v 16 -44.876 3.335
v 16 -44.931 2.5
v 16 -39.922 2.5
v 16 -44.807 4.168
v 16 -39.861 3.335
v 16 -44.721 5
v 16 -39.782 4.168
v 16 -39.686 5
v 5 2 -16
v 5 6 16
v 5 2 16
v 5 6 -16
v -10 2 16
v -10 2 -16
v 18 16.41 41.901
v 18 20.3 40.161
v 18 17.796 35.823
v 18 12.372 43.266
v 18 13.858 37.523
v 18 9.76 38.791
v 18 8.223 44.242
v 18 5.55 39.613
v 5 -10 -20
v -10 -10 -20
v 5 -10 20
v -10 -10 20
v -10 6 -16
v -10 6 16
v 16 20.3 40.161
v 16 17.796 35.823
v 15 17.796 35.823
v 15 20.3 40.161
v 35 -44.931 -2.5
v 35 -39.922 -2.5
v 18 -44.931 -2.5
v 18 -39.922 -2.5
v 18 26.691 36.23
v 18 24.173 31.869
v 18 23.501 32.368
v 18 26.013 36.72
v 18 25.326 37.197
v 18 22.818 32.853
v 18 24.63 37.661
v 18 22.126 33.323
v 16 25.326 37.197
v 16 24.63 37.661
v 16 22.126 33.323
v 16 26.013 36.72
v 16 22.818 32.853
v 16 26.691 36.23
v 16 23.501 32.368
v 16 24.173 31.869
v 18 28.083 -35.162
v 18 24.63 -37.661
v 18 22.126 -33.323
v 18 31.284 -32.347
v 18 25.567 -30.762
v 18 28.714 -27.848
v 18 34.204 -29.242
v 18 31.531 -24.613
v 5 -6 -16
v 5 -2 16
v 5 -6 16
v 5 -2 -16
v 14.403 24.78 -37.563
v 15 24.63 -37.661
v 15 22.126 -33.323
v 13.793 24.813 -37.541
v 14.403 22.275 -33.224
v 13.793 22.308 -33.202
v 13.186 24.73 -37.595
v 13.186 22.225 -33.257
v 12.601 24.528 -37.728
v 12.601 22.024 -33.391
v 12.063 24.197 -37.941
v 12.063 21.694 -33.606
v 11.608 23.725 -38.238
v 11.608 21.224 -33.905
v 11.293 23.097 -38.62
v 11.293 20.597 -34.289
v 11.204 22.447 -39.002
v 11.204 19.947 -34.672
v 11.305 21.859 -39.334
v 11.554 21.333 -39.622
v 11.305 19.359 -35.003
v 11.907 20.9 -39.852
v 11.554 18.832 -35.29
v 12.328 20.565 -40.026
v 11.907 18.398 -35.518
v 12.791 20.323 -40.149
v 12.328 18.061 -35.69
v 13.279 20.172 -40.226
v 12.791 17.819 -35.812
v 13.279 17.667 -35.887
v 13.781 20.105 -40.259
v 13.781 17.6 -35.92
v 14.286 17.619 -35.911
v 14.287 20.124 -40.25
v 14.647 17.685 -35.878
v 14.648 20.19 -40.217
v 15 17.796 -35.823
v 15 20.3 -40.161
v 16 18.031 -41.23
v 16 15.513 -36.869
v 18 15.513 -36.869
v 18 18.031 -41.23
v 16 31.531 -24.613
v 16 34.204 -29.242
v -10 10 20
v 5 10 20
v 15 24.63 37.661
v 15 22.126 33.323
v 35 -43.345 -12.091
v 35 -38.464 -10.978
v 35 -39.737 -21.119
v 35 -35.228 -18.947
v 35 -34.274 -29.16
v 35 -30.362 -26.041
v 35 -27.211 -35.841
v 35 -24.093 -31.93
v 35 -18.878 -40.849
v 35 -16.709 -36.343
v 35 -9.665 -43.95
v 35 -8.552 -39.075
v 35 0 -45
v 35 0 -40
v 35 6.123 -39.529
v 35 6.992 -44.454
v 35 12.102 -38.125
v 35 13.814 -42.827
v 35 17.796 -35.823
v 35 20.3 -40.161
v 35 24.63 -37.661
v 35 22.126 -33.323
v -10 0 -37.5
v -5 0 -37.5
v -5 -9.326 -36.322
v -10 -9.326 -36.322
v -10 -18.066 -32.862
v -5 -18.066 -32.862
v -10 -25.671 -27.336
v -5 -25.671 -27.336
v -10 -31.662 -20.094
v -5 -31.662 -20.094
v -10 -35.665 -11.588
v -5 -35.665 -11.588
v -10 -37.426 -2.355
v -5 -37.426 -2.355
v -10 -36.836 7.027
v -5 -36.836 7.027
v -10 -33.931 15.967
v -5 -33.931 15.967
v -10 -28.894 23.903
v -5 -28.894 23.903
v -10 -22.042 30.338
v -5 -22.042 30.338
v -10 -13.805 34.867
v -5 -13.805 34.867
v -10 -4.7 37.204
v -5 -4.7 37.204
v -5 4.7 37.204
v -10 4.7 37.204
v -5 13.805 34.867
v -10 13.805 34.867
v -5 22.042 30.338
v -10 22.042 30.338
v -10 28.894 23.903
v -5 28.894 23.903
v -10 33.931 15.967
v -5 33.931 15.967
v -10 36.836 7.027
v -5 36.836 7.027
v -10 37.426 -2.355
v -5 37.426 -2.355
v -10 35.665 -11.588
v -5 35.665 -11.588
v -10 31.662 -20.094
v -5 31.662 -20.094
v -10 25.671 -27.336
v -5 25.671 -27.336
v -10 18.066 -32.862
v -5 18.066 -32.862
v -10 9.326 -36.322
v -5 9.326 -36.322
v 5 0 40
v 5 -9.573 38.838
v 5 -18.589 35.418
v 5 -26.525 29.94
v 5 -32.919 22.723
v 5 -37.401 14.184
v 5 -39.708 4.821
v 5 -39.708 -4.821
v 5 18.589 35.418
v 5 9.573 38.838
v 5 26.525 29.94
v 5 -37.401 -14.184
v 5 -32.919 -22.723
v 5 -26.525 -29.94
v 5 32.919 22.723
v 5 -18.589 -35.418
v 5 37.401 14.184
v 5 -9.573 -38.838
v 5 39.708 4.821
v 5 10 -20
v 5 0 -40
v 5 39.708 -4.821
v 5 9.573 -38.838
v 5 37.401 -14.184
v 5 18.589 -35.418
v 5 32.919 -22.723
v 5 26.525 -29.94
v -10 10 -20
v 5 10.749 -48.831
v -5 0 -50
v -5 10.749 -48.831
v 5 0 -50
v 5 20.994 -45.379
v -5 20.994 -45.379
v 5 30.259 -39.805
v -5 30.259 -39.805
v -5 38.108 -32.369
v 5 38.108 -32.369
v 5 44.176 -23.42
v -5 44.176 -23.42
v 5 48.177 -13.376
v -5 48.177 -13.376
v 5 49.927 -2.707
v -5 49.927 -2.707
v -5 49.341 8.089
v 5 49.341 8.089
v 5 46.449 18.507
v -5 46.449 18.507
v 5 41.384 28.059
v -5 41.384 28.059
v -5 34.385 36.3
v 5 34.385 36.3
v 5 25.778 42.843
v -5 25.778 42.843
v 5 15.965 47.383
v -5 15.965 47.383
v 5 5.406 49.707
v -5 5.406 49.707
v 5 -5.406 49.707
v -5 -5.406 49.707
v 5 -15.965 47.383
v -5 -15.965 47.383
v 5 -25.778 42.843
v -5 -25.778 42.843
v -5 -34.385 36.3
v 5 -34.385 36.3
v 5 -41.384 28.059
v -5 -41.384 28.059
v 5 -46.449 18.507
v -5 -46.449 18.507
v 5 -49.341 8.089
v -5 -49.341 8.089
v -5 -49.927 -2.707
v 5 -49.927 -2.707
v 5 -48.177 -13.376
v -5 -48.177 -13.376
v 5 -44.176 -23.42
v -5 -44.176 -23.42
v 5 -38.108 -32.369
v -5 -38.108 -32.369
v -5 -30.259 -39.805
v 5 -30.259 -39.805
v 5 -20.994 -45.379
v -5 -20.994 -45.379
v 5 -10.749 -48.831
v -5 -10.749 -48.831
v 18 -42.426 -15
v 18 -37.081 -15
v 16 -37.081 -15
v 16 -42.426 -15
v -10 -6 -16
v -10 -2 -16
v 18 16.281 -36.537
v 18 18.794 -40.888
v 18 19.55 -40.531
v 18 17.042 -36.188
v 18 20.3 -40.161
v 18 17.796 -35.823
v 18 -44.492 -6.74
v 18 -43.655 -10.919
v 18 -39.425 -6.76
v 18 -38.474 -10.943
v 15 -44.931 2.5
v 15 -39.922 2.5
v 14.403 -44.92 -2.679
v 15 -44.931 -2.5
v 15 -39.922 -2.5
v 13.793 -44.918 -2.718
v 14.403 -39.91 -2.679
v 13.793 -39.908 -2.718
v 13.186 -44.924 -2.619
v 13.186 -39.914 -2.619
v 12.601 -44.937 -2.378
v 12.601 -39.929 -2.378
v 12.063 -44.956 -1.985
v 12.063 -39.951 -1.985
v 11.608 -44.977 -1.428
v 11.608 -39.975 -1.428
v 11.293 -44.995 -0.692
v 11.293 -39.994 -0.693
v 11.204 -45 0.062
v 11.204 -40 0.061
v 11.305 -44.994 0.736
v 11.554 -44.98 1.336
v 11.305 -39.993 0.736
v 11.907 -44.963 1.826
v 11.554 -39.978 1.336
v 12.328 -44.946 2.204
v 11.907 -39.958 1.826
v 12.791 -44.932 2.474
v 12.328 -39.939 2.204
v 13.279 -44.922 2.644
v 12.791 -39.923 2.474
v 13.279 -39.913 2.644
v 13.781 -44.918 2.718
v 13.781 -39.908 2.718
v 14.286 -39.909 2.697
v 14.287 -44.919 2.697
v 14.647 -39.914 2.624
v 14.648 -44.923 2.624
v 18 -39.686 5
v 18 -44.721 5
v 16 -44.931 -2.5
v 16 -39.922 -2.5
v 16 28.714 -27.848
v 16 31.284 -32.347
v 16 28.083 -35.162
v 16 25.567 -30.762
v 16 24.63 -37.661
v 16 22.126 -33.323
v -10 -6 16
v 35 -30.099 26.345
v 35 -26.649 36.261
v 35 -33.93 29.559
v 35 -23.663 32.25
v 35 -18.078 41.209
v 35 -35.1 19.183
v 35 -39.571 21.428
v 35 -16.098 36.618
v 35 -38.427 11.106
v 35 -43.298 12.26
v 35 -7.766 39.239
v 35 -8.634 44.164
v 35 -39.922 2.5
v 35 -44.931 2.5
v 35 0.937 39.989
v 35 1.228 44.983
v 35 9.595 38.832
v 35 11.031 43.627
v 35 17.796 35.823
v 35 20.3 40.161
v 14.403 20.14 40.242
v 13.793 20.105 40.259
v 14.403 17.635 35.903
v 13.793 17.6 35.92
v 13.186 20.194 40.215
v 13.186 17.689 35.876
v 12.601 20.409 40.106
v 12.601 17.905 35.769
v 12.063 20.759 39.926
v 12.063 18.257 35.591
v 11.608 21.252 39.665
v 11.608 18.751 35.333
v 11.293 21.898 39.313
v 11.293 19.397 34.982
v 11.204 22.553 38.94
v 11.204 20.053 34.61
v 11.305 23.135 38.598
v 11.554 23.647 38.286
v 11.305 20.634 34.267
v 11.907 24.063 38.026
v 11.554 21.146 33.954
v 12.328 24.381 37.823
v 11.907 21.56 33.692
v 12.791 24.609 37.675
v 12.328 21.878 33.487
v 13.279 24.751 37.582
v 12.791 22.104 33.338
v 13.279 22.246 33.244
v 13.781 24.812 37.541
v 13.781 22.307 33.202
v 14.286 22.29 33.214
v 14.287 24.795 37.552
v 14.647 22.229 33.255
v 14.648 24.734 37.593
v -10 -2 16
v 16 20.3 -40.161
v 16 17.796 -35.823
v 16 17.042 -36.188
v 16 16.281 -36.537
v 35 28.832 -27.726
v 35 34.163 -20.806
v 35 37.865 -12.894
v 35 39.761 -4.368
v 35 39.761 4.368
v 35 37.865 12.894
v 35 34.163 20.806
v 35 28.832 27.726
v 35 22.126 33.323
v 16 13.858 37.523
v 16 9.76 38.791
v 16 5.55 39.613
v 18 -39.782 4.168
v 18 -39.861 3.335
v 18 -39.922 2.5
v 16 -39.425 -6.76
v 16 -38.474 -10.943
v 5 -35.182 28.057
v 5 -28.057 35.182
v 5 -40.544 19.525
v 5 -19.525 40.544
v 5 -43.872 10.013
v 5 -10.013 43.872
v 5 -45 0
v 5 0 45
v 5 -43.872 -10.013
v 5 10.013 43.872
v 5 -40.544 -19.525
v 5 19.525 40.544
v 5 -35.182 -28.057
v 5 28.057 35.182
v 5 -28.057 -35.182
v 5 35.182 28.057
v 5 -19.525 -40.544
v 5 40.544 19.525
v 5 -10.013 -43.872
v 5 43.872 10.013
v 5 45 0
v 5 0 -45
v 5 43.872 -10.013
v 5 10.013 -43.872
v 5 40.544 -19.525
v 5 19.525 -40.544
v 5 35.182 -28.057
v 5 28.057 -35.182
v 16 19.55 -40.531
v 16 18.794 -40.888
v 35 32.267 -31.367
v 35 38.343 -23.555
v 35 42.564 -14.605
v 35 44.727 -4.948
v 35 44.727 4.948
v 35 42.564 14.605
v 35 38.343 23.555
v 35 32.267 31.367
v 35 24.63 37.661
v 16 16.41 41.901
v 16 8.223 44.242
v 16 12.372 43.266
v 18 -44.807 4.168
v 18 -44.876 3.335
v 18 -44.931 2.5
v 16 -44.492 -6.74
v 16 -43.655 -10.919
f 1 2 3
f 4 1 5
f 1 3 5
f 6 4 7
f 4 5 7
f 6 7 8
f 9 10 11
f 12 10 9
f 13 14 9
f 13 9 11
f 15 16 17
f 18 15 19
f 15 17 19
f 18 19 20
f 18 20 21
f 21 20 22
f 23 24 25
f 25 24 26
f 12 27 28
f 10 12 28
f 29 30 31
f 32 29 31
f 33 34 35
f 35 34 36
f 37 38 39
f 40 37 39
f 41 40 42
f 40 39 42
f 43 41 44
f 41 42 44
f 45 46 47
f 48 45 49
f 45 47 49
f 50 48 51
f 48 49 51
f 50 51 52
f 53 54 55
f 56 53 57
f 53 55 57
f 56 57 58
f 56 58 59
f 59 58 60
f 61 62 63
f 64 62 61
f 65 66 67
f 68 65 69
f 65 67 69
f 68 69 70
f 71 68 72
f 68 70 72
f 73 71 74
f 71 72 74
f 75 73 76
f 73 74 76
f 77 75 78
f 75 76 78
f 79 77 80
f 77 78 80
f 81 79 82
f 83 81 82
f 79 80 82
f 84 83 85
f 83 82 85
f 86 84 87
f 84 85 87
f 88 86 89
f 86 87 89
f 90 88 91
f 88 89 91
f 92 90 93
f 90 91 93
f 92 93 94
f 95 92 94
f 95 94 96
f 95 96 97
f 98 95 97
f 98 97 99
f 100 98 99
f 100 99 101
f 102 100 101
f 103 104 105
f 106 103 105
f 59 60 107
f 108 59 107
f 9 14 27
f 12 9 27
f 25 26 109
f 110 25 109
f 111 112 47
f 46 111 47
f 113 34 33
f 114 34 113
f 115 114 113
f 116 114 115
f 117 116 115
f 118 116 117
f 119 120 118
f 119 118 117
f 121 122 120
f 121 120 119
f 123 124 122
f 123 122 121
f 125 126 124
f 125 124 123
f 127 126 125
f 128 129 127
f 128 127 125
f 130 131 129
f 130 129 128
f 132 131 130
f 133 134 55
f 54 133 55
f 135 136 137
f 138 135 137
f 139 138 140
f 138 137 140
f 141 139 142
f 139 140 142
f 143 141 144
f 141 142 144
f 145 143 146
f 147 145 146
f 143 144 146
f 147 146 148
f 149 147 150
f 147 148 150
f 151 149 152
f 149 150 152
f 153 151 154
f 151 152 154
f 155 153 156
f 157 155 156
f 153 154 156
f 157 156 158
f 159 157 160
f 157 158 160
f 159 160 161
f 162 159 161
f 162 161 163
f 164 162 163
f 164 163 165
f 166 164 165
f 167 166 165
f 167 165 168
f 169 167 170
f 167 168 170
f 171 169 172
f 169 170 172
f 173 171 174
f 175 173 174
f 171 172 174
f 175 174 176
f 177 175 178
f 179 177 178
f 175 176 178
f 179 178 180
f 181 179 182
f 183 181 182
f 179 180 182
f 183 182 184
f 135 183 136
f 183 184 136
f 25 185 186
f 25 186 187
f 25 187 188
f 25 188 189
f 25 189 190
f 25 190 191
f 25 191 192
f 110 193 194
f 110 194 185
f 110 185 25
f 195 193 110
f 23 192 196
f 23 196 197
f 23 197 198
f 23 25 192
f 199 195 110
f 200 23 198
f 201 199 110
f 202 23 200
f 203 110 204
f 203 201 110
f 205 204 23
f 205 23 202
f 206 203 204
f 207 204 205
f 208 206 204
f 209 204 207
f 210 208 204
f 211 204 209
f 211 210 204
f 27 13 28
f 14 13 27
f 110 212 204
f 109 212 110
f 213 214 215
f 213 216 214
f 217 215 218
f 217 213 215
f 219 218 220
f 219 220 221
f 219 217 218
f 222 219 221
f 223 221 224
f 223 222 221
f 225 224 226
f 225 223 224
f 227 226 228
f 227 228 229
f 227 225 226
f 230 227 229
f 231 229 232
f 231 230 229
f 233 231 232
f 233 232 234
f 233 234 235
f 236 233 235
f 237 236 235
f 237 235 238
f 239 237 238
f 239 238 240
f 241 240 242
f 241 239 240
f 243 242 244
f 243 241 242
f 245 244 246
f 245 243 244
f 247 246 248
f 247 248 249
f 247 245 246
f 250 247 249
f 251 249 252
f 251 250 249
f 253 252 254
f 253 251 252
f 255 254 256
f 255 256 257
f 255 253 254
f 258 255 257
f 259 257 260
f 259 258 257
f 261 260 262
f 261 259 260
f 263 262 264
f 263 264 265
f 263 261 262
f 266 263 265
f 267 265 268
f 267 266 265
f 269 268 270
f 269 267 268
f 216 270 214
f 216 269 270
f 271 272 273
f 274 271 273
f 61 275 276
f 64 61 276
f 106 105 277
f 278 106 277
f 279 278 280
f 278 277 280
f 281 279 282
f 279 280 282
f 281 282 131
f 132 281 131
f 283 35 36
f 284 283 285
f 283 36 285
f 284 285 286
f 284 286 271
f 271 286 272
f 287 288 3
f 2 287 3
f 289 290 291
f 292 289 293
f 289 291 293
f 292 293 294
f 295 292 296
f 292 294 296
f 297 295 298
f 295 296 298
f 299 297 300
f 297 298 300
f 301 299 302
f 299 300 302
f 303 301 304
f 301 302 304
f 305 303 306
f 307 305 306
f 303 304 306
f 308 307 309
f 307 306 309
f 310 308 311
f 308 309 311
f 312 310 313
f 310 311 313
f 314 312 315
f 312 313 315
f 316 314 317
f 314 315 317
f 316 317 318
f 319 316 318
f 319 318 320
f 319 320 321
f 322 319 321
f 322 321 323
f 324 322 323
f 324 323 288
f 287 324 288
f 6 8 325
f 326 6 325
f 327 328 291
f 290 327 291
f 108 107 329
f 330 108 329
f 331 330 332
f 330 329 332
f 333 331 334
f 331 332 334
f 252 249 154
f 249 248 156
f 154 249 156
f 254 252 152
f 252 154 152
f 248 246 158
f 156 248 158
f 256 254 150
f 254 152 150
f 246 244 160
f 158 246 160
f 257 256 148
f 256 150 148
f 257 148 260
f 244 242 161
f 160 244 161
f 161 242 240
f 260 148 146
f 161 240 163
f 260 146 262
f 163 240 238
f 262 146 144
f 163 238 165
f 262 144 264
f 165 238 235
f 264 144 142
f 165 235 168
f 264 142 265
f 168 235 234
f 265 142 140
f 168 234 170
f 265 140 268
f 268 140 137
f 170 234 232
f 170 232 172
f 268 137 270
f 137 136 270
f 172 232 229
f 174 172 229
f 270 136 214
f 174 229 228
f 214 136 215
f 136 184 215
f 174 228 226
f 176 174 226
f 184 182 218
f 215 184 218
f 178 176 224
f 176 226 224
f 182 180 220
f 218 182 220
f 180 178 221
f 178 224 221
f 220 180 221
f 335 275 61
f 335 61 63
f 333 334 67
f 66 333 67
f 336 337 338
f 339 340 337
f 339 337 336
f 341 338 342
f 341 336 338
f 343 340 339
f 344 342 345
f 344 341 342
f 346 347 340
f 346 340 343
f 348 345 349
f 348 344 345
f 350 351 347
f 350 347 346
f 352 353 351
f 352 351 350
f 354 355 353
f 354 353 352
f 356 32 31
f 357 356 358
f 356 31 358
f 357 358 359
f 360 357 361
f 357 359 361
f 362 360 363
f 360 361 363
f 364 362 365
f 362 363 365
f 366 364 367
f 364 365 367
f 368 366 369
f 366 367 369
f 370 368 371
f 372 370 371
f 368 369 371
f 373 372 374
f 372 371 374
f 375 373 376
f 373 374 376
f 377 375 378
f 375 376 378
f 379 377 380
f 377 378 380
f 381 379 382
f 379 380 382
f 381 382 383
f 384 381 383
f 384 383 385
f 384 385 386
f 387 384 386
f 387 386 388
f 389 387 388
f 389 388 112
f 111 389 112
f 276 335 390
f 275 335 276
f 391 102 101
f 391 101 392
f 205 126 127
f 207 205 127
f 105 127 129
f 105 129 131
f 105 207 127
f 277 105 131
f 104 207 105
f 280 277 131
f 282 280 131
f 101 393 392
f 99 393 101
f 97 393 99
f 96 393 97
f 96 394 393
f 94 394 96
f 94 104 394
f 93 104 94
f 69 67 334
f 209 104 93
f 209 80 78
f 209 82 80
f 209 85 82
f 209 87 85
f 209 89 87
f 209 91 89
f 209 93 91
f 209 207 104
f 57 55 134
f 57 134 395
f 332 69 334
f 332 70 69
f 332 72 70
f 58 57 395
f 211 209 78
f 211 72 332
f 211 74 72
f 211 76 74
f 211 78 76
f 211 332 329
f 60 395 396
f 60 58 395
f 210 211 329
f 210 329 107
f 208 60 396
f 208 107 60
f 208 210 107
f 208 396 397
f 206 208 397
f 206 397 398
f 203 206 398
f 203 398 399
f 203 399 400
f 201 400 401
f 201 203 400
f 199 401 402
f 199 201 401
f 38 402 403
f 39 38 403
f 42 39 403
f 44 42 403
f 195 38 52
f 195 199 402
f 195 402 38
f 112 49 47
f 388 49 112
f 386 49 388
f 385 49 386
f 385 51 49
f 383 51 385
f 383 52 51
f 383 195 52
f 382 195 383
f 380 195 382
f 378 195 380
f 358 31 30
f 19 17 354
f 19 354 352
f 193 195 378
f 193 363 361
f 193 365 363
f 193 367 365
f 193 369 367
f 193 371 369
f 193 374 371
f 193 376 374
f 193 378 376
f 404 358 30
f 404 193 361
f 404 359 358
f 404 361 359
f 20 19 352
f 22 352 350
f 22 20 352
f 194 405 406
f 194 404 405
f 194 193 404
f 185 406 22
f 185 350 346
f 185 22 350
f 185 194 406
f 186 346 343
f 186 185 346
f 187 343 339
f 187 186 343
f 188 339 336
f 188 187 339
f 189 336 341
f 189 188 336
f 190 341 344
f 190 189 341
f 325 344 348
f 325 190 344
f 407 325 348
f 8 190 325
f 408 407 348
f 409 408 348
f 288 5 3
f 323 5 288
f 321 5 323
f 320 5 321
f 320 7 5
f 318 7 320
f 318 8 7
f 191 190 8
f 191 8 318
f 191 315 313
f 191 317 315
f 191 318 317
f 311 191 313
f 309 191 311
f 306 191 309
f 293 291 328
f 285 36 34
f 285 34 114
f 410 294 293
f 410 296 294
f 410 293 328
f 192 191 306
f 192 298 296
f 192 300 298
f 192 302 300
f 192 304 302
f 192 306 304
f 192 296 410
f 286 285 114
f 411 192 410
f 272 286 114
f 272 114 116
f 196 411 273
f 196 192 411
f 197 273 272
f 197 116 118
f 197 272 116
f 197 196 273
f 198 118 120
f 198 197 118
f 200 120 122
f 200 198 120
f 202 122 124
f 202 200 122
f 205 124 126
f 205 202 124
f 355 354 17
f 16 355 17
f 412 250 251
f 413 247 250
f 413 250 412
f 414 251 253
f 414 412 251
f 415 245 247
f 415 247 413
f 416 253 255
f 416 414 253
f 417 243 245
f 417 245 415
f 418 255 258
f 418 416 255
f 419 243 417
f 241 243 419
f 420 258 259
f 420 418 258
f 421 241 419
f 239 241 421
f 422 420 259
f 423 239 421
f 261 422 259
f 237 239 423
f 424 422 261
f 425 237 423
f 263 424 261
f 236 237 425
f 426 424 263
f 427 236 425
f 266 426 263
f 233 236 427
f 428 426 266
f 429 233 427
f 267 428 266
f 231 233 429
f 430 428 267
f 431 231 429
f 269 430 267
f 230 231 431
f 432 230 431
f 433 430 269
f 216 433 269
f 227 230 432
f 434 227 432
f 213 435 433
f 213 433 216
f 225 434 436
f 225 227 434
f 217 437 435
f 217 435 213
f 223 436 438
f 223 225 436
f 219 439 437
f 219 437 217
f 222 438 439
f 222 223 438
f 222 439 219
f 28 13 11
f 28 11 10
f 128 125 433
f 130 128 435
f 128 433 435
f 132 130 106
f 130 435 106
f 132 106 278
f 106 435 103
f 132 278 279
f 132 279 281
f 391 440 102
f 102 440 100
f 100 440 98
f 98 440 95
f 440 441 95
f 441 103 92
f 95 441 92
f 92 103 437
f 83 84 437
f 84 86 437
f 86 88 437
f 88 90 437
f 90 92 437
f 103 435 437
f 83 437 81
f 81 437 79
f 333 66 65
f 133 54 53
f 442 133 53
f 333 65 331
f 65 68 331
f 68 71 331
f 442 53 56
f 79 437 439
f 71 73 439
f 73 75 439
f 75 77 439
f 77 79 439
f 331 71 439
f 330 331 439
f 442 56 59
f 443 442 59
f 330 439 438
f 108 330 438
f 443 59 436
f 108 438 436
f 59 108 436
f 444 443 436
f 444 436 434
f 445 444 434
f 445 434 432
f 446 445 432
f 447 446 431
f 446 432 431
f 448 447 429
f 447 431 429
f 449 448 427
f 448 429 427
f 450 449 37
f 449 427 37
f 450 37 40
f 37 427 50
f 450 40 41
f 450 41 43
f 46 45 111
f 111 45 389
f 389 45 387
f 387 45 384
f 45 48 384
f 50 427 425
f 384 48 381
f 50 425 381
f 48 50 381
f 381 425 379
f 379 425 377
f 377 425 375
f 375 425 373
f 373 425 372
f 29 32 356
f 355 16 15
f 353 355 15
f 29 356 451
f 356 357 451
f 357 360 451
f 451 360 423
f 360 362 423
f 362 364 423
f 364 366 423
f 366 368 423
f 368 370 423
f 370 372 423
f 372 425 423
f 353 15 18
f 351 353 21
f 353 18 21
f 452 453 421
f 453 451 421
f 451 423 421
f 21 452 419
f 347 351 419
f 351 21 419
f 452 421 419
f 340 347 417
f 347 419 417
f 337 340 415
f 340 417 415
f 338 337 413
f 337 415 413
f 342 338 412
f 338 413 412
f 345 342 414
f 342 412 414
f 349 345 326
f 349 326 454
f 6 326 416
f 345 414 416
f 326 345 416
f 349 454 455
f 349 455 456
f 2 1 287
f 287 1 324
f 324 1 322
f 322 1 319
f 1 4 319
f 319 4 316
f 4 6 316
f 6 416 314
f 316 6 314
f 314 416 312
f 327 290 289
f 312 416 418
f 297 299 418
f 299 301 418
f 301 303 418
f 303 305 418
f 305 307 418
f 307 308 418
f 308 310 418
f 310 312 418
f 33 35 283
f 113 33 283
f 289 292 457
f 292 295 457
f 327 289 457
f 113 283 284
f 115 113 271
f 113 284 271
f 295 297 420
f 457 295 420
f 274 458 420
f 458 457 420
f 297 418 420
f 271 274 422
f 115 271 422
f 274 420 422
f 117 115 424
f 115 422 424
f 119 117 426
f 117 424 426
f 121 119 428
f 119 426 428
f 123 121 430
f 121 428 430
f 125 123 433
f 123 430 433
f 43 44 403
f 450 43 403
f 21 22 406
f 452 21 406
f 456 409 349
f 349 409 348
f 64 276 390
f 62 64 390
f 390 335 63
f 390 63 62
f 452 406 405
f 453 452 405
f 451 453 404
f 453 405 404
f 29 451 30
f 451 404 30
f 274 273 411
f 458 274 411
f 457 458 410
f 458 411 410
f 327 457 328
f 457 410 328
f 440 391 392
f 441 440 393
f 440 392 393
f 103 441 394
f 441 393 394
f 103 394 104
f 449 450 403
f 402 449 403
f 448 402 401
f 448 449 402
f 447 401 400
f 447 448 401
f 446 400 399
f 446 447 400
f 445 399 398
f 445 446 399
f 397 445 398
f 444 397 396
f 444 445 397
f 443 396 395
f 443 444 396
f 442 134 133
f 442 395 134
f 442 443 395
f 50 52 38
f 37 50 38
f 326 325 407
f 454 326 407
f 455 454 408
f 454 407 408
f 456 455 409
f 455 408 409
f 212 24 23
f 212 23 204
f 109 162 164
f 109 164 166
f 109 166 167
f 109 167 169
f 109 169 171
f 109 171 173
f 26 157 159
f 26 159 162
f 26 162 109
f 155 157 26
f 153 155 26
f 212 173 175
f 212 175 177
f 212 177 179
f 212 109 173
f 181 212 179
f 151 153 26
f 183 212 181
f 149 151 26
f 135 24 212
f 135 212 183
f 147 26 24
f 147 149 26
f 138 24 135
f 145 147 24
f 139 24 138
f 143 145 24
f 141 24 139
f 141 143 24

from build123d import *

# Parameters (mm, degrees)
SKETCH1_R           = 50
BOSS_EXTRUDE1_DEPTH = 5
SKETCH2_R           = 45
SKETCH2_R_2         = 40
BOSS_EXTRUDE2_DEPTH = 30
SKETCH7_R           = 37.5
BOSS_EXTRUDE5_DEPTH = 5
CUT_EXTRUDE5_DEPTH  = 79.89866919
SKETCH8_W           = 40
SKETCH8_H           = 20
SKETCH8_W_2         = 32
SKETCH8_H_2         = 12
SKETCH8_H_3         = 4
CUT_EXTRUDE4_DEPTH  = 40
CIRPATTERN6_COUNT   = 3


with BuildPart() as part:
    # Sketch1 → Boss-Extrude1 (new, symmetric)
    with BuildSketch(Plane(origin=(0, 0, 0), x_dir=(0, 0, -1), z_dir=(1, 0, 0))):
        Circle(SKETCH1_R)
    extrude(amount=BOSS_EXTRUDE1_DEPTH, both=True)

    # Sketch2 → Boss-Extrude2 (add)
    with BuildSketch(Plane(origin=(5, 0, 0), x_dir=(0, 0, -1), z_dir=(1, 0, 0))):
        Circle(SKETCH2_R)
        Circle(SKETCH2_R_2, mode=Mode.SUBTRACT)
    extrude(amount=BOSS_EXTRUDE2_DEPTH)

    # Sketch7 → Boss-Extrude5 (add)
    with BuildSketch(Plane.ZY.offset(5)):
        with Locations(Location((0, 0, 0), (0, 0, 180))):
            Circle(SKETCH7_R)
    extrude(amount=BOSS_EXTRUDE5_DEPTH)

    # Sketch6 → Cut-Extrude5 (cut, through all)
    with BuildSketch(Plane(origin=(0, 0, 0), x_dir=(1, 0, 0), z_dir=(0, 1, 0))):
        with BuildLine():
            Line((18, -2.5), (55, -2.5))
            Line((55, -2.5), (55, 0))
            Line((55, 0), (55, 2.5))
            Line((55, 2.5), (18, 2.5))
            Line((18, 2.5), (18, 15))
            Line((18, 15), (16, 15))
            Line((16, 15), (16, 2.5))
            Line((16, 2.5), (15, 2.5))
            ThreePointArc((15, 2.5), (11.203450847, 0), (15, -2.5))
            Line((15, -2.5), (16, -2.5))
            Line((16, -2.5), (16, -5))
            Line((16, -5), (18, -5))
            Line((18, -5), (18, -2.5))
        make_face()
    cut_extrude5 = extrude(amount=-CUT_EXTRUDE5_DEPTH, mode=Mode.SUBTRACT)

    # Sketch8 → Cut-Extrude4 (cut)
    with BuildSketch(Plane.ZY.offset(10)):
        Rectangle(SKETCH8_W, SKETCH8_H)
        Rectangle(SKETCH8_W_2, SKETCH8_H_2, mode=Mode.SUBTRACT)
        Rectangle(SKETCH8_W_2, SKETCH8_H_3)
    extrude(amount=-CUT_EXTRUDE4_DEPTH, mode=Mode.SUBTRACT)


with BuildPart() as cut_extrude4_piece_1:
    # of the separate pieces the step leaves, piece 1, a body of its own (cut_extrude4_pieces)
    add(part.part.solids().sort_by_distance((-5, 0, -50))[0])

    # CirPattern6: Cut-Extrude5 ×3 about axis
    cirpattern6_axis = Axis((0, 0, 0), (1, 0, 0))
    for i in range(1, CIRPATTERN6_COUNT):
        add(cut_extrude5.rotate(cirpattern6_axis, i * 360 / CIRPATTERN6_COUNT), mode=Mode.SUBTRACT)


with BuildPart() as cut_extrude4_piece_2:
    # of the separate pieces the step leaves, piece 2, a body of its own (cut_extrude4_pieces)
    add(part.part.solids().sort_by_distance((-10, -6, -16))[0])


with BuildPart() as cut_extrude4_piece_3:
    # of the separate pieces the step leaves, piece 3, a body of its own (cut_extrude4_pieces)
    add(part.part.solids().sort_by_distance((-10, 2, 16))[0])


solid = Compound([cut_extrude4_piece_1.part, cut_extrude4_piece_2.part, cut_extrude4_piece_3.part])
